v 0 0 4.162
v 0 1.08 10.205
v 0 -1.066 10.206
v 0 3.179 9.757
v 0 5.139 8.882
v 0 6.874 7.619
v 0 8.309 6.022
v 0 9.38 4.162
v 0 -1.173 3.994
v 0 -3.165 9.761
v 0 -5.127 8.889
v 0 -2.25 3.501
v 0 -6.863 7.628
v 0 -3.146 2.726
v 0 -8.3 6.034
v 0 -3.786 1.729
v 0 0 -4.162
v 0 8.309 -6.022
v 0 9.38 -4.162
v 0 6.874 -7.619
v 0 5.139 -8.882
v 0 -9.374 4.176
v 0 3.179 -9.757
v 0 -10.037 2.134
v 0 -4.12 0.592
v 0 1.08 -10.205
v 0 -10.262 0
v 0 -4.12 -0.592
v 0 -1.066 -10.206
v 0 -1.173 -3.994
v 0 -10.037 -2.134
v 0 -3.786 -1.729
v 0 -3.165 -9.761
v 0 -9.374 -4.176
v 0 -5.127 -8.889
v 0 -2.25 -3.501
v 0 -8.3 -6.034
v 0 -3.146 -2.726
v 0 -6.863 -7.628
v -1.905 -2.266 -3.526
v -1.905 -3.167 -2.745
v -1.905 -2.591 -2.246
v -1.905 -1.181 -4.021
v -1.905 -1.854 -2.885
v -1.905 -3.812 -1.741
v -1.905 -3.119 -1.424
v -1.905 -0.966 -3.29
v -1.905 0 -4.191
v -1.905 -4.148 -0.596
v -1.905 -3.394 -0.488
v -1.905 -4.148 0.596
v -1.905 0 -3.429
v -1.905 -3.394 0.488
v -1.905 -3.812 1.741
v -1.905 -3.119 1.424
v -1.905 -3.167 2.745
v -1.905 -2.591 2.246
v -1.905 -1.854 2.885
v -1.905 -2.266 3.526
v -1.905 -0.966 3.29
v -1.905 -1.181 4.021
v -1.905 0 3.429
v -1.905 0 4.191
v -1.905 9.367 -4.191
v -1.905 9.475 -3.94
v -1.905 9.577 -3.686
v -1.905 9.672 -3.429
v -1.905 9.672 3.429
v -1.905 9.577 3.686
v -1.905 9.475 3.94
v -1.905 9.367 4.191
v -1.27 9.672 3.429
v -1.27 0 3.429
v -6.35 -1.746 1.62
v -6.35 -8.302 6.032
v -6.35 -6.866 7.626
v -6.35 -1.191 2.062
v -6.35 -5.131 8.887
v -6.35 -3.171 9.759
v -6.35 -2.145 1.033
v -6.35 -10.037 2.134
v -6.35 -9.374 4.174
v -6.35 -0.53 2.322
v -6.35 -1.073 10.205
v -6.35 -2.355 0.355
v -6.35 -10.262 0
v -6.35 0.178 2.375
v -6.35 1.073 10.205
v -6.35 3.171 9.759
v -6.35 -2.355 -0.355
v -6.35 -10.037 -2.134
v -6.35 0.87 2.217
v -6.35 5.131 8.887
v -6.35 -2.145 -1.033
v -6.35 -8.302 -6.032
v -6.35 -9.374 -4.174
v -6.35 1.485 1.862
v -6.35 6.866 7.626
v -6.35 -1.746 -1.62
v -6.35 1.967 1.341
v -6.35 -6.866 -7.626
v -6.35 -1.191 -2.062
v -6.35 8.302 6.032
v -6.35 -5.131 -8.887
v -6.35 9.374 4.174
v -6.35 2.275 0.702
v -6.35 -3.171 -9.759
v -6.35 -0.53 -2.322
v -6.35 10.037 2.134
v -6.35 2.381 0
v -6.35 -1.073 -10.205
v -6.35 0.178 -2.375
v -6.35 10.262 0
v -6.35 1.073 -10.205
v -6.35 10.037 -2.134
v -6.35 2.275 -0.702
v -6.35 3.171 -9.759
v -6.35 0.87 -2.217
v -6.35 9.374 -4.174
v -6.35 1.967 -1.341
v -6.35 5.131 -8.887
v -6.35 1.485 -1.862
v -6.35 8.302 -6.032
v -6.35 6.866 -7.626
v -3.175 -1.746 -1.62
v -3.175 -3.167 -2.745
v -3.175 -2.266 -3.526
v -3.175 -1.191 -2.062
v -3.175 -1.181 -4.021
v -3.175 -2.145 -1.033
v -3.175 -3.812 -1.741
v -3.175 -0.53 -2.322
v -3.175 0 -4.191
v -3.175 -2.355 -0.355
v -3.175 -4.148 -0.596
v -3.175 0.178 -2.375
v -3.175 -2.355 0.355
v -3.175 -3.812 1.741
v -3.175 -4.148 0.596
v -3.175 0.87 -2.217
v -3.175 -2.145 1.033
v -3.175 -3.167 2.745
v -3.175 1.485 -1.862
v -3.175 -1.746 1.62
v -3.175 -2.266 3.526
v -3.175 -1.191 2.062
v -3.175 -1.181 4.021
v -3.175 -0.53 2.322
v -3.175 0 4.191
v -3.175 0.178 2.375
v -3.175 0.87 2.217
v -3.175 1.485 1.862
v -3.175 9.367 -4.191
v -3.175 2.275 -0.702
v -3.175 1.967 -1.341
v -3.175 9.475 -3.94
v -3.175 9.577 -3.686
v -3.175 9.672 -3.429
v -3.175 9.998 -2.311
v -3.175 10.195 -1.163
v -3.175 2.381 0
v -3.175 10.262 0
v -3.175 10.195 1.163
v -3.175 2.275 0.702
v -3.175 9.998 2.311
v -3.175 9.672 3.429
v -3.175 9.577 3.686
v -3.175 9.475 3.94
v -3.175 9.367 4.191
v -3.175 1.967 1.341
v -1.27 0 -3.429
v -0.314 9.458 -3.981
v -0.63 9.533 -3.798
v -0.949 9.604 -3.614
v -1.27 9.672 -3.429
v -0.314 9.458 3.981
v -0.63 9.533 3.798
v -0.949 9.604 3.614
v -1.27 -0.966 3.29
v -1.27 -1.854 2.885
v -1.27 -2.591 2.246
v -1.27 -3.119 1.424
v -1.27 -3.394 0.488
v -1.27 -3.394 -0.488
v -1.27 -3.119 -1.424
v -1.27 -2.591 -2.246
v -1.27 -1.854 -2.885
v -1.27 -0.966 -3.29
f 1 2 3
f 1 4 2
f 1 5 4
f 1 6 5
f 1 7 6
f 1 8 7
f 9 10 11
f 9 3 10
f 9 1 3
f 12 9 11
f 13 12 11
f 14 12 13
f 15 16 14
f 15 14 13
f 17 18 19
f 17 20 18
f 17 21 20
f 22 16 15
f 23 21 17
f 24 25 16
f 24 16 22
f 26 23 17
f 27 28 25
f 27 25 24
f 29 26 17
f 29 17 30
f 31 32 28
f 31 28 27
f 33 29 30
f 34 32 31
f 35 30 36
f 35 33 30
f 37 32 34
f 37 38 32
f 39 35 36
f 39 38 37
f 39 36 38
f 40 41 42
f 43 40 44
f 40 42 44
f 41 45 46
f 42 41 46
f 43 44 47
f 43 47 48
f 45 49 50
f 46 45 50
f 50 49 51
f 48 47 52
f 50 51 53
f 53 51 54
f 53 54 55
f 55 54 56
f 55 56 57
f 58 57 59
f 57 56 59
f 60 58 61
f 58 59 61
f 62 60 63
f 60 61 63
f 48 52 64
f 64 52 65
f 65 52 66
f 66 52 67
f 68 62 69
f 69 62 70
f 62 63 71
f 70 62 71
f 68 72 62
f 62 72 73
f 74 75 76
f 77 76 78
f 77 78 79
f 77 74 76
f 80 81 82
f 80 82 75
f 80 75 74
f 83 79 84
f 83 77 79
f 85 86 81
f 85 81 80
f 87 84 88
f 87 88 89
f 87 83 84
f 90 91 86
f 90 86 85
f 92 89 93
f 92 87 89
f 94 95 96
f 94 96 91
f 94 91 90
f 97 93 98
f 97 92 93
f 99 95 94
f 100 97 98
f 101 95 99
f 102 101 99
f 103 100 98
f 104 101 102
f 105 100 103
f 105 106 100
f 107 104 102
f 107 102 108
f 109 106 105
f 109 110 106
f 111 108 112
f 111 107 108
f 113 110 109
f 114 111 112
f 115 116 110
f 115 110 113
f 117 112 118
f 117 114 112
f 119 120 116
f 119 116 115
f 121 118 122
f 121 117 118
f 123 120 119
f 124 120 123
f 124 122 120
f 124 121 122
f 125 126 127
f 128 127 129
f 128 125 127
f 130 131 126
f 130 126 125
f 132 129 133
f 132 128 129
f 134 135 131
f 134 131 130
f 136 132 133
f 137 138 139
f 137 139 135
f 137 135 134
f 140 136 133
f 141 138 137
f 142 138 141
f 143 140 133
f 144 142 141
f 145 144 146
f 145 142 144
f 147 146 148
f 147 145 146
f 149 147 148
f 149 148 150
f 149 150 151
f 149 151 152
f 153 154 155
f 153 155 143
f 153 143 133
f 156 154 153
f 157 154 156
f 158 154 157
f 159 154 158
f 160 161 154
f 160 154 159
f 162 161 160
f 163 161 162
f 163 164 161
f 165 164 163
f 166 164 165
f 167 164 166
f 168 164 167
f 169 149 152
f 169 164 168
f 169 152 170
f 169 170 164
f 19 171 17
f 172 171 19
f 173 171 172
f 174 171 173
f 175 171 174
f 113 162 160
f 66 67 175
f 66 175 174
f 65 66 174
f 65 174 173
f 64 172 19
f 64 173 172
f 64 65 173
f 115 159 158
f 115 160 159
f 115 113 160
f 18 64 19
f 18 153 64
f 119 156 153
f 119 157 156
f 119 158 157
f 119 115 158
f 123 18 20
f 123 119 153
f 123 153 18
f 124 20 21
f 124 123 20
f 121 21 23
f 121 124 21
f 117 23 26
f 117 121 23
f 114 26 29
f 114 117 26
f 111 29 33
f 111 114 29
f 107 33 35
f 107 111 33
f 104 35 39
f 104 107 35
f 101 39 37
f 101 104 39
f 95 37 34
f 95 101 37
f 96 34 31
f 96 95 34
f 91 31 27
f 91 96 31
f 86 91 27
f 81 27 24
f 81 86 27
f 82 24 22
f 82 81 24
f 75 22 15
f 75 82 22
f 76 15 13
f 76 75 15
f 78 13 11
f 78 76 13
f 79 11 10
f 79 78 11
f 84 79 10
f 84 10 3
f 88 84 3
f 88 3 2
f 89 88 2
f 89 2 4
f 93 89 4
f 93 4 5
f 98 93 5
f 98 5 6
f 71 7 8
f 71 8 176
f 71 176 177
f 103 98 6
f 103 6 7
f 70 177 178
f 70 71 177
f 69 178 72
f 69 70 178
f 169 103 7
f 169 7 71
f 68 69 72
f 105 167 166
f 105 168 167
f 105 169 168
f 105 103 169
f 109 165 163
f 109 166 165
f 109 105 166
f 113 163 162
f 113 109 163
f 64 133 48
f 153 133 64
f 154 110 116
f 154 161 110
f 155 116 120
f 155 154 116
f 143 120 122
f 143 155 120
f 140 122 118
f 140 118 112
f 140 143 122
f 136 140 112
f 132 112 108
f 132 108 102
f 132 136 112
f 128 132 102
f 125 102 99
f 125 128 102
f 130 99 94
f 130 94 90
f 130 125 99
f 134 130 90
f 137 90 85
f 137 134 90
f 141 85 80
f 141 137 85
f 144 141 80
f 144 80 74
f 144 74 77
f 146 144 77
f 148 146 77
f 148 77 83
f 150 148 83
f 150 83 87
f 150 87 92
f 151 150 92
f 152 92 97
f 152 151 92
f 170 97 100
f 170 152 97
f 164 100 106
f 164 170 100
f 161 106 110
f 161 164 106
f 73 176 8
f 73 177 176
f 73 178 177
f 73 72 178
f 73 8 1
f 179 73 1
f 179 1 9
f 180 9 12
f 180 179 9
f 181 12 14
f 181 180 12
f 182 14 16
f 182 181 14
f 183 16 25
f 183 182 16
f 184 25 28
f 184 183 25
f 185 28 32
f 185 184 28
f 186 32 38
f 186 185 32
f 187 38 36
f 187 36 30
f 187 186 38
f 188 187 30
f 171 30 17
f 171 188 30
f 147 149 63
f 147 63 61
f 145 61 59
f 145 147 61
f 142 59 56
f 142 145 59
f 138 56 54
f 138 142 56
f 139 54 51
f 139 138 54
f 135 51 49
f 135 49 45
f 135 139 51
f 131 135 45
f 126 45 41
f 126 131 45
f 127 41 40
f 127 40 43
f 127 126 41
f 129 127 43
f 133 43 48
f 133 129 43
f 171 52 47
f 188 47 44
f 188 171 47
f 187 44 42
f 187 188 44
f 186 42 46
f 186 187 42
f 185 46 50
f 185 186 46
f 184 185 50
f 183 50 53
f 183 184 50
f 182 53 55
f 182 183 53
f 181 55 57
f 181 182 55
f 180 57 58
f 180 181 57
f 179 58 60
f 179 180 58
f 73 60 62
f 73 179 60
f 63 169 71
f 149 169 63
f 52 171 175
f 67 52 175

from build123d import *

# Parameters (mm, degrees)
F3_DEPTH = 3.175
F5_DEPTH = 1.27
F6_SIZE2 = 1.27
F6_SIZE  = 0.7332348419


with BuildPart() as f1:
    # F0 (on Top) → F1 (revolve)
    with BuildSketch(Plane.XY):
        Polygon((0, 3.429), (0, 10.2616), (-6.35, 10.2616), (-6.35, 2.38125), (-3.175, 2.38125), (-3.175, 4.191), (-1.905, 4.191), (-1.905, 3.429), align=None)
    revolve(axis=Axis((-3.175, 0, 0), (-1, 0, 0)))

    # F2 (on face) → F3 (cut, through all)
    with BuildSketch(Plane.YZ):
        with BuildLine():
            ThreePointArc((3.429, 0), (2.4246691527, -2.4246691527), (0, -3.429))
            Line((0, -3.429), (9.6717316733, -3.429))
            ThreePointArc((9.6717316733, -3.429), (10.1130578041, -1.7396828477), (10.2616, 0))
            ThreePointArc((10.2616, 0), (10.1130578041, 1.7396828477), (9.6717316733, 3.429))
            Line((9.6717316733, 3.429), (0, 3.429))
            ThreePointArc((0, 3.429), (2.4246691527, 2.4246691527), (3.429, 0))
        make_face()
    extrude(amount=-F3_DEPTH, mode=Mode.SUBTRACT)

    # F4 (on face) → F5 (cut)
    with BuildSketch(Plane.YZ.offset(-3.175)):
        with BuildLine():
            ThreePointArc((0, 4.191), (-4.191, 0), (0, -4.191))
            Line((0, -4.191), (9.3667472241, -4.191))
            ThreePointArc((9.3667472241, -4.191), (9.5268610088, -3.8130504689), (9.6717316733, -3.429))
            ThreePointArc((9.6717316733, -3.429), (10.2616, 0), (9.6717316733, 3.429))
            ThreePointArc((9.6717316733, 3.429), (9.5268610088, 3.8130504689), (9.3667472241, 4.191))
            Line((9.3667472241, 4.191), (0, 4.191))
        make_face()
    extrude(amount=F5_DEPTH, mode=Mode.SUBTRACT)

    # F6
    f6_edges = [f1.edges().sort_by_distance(p)[0] for p in [
        (0, 4.835866, -3.429),
        (0, 4.835866, 3.429),
    ]]
    f6_side = f1.faces().sort_by_distance((0, 4.835866, -3.715101))[0]
    chamfer(f6_edges, length=F6_SIZE, length2=F6_SIZE2, reference=f6_side)


solid = f1.part
